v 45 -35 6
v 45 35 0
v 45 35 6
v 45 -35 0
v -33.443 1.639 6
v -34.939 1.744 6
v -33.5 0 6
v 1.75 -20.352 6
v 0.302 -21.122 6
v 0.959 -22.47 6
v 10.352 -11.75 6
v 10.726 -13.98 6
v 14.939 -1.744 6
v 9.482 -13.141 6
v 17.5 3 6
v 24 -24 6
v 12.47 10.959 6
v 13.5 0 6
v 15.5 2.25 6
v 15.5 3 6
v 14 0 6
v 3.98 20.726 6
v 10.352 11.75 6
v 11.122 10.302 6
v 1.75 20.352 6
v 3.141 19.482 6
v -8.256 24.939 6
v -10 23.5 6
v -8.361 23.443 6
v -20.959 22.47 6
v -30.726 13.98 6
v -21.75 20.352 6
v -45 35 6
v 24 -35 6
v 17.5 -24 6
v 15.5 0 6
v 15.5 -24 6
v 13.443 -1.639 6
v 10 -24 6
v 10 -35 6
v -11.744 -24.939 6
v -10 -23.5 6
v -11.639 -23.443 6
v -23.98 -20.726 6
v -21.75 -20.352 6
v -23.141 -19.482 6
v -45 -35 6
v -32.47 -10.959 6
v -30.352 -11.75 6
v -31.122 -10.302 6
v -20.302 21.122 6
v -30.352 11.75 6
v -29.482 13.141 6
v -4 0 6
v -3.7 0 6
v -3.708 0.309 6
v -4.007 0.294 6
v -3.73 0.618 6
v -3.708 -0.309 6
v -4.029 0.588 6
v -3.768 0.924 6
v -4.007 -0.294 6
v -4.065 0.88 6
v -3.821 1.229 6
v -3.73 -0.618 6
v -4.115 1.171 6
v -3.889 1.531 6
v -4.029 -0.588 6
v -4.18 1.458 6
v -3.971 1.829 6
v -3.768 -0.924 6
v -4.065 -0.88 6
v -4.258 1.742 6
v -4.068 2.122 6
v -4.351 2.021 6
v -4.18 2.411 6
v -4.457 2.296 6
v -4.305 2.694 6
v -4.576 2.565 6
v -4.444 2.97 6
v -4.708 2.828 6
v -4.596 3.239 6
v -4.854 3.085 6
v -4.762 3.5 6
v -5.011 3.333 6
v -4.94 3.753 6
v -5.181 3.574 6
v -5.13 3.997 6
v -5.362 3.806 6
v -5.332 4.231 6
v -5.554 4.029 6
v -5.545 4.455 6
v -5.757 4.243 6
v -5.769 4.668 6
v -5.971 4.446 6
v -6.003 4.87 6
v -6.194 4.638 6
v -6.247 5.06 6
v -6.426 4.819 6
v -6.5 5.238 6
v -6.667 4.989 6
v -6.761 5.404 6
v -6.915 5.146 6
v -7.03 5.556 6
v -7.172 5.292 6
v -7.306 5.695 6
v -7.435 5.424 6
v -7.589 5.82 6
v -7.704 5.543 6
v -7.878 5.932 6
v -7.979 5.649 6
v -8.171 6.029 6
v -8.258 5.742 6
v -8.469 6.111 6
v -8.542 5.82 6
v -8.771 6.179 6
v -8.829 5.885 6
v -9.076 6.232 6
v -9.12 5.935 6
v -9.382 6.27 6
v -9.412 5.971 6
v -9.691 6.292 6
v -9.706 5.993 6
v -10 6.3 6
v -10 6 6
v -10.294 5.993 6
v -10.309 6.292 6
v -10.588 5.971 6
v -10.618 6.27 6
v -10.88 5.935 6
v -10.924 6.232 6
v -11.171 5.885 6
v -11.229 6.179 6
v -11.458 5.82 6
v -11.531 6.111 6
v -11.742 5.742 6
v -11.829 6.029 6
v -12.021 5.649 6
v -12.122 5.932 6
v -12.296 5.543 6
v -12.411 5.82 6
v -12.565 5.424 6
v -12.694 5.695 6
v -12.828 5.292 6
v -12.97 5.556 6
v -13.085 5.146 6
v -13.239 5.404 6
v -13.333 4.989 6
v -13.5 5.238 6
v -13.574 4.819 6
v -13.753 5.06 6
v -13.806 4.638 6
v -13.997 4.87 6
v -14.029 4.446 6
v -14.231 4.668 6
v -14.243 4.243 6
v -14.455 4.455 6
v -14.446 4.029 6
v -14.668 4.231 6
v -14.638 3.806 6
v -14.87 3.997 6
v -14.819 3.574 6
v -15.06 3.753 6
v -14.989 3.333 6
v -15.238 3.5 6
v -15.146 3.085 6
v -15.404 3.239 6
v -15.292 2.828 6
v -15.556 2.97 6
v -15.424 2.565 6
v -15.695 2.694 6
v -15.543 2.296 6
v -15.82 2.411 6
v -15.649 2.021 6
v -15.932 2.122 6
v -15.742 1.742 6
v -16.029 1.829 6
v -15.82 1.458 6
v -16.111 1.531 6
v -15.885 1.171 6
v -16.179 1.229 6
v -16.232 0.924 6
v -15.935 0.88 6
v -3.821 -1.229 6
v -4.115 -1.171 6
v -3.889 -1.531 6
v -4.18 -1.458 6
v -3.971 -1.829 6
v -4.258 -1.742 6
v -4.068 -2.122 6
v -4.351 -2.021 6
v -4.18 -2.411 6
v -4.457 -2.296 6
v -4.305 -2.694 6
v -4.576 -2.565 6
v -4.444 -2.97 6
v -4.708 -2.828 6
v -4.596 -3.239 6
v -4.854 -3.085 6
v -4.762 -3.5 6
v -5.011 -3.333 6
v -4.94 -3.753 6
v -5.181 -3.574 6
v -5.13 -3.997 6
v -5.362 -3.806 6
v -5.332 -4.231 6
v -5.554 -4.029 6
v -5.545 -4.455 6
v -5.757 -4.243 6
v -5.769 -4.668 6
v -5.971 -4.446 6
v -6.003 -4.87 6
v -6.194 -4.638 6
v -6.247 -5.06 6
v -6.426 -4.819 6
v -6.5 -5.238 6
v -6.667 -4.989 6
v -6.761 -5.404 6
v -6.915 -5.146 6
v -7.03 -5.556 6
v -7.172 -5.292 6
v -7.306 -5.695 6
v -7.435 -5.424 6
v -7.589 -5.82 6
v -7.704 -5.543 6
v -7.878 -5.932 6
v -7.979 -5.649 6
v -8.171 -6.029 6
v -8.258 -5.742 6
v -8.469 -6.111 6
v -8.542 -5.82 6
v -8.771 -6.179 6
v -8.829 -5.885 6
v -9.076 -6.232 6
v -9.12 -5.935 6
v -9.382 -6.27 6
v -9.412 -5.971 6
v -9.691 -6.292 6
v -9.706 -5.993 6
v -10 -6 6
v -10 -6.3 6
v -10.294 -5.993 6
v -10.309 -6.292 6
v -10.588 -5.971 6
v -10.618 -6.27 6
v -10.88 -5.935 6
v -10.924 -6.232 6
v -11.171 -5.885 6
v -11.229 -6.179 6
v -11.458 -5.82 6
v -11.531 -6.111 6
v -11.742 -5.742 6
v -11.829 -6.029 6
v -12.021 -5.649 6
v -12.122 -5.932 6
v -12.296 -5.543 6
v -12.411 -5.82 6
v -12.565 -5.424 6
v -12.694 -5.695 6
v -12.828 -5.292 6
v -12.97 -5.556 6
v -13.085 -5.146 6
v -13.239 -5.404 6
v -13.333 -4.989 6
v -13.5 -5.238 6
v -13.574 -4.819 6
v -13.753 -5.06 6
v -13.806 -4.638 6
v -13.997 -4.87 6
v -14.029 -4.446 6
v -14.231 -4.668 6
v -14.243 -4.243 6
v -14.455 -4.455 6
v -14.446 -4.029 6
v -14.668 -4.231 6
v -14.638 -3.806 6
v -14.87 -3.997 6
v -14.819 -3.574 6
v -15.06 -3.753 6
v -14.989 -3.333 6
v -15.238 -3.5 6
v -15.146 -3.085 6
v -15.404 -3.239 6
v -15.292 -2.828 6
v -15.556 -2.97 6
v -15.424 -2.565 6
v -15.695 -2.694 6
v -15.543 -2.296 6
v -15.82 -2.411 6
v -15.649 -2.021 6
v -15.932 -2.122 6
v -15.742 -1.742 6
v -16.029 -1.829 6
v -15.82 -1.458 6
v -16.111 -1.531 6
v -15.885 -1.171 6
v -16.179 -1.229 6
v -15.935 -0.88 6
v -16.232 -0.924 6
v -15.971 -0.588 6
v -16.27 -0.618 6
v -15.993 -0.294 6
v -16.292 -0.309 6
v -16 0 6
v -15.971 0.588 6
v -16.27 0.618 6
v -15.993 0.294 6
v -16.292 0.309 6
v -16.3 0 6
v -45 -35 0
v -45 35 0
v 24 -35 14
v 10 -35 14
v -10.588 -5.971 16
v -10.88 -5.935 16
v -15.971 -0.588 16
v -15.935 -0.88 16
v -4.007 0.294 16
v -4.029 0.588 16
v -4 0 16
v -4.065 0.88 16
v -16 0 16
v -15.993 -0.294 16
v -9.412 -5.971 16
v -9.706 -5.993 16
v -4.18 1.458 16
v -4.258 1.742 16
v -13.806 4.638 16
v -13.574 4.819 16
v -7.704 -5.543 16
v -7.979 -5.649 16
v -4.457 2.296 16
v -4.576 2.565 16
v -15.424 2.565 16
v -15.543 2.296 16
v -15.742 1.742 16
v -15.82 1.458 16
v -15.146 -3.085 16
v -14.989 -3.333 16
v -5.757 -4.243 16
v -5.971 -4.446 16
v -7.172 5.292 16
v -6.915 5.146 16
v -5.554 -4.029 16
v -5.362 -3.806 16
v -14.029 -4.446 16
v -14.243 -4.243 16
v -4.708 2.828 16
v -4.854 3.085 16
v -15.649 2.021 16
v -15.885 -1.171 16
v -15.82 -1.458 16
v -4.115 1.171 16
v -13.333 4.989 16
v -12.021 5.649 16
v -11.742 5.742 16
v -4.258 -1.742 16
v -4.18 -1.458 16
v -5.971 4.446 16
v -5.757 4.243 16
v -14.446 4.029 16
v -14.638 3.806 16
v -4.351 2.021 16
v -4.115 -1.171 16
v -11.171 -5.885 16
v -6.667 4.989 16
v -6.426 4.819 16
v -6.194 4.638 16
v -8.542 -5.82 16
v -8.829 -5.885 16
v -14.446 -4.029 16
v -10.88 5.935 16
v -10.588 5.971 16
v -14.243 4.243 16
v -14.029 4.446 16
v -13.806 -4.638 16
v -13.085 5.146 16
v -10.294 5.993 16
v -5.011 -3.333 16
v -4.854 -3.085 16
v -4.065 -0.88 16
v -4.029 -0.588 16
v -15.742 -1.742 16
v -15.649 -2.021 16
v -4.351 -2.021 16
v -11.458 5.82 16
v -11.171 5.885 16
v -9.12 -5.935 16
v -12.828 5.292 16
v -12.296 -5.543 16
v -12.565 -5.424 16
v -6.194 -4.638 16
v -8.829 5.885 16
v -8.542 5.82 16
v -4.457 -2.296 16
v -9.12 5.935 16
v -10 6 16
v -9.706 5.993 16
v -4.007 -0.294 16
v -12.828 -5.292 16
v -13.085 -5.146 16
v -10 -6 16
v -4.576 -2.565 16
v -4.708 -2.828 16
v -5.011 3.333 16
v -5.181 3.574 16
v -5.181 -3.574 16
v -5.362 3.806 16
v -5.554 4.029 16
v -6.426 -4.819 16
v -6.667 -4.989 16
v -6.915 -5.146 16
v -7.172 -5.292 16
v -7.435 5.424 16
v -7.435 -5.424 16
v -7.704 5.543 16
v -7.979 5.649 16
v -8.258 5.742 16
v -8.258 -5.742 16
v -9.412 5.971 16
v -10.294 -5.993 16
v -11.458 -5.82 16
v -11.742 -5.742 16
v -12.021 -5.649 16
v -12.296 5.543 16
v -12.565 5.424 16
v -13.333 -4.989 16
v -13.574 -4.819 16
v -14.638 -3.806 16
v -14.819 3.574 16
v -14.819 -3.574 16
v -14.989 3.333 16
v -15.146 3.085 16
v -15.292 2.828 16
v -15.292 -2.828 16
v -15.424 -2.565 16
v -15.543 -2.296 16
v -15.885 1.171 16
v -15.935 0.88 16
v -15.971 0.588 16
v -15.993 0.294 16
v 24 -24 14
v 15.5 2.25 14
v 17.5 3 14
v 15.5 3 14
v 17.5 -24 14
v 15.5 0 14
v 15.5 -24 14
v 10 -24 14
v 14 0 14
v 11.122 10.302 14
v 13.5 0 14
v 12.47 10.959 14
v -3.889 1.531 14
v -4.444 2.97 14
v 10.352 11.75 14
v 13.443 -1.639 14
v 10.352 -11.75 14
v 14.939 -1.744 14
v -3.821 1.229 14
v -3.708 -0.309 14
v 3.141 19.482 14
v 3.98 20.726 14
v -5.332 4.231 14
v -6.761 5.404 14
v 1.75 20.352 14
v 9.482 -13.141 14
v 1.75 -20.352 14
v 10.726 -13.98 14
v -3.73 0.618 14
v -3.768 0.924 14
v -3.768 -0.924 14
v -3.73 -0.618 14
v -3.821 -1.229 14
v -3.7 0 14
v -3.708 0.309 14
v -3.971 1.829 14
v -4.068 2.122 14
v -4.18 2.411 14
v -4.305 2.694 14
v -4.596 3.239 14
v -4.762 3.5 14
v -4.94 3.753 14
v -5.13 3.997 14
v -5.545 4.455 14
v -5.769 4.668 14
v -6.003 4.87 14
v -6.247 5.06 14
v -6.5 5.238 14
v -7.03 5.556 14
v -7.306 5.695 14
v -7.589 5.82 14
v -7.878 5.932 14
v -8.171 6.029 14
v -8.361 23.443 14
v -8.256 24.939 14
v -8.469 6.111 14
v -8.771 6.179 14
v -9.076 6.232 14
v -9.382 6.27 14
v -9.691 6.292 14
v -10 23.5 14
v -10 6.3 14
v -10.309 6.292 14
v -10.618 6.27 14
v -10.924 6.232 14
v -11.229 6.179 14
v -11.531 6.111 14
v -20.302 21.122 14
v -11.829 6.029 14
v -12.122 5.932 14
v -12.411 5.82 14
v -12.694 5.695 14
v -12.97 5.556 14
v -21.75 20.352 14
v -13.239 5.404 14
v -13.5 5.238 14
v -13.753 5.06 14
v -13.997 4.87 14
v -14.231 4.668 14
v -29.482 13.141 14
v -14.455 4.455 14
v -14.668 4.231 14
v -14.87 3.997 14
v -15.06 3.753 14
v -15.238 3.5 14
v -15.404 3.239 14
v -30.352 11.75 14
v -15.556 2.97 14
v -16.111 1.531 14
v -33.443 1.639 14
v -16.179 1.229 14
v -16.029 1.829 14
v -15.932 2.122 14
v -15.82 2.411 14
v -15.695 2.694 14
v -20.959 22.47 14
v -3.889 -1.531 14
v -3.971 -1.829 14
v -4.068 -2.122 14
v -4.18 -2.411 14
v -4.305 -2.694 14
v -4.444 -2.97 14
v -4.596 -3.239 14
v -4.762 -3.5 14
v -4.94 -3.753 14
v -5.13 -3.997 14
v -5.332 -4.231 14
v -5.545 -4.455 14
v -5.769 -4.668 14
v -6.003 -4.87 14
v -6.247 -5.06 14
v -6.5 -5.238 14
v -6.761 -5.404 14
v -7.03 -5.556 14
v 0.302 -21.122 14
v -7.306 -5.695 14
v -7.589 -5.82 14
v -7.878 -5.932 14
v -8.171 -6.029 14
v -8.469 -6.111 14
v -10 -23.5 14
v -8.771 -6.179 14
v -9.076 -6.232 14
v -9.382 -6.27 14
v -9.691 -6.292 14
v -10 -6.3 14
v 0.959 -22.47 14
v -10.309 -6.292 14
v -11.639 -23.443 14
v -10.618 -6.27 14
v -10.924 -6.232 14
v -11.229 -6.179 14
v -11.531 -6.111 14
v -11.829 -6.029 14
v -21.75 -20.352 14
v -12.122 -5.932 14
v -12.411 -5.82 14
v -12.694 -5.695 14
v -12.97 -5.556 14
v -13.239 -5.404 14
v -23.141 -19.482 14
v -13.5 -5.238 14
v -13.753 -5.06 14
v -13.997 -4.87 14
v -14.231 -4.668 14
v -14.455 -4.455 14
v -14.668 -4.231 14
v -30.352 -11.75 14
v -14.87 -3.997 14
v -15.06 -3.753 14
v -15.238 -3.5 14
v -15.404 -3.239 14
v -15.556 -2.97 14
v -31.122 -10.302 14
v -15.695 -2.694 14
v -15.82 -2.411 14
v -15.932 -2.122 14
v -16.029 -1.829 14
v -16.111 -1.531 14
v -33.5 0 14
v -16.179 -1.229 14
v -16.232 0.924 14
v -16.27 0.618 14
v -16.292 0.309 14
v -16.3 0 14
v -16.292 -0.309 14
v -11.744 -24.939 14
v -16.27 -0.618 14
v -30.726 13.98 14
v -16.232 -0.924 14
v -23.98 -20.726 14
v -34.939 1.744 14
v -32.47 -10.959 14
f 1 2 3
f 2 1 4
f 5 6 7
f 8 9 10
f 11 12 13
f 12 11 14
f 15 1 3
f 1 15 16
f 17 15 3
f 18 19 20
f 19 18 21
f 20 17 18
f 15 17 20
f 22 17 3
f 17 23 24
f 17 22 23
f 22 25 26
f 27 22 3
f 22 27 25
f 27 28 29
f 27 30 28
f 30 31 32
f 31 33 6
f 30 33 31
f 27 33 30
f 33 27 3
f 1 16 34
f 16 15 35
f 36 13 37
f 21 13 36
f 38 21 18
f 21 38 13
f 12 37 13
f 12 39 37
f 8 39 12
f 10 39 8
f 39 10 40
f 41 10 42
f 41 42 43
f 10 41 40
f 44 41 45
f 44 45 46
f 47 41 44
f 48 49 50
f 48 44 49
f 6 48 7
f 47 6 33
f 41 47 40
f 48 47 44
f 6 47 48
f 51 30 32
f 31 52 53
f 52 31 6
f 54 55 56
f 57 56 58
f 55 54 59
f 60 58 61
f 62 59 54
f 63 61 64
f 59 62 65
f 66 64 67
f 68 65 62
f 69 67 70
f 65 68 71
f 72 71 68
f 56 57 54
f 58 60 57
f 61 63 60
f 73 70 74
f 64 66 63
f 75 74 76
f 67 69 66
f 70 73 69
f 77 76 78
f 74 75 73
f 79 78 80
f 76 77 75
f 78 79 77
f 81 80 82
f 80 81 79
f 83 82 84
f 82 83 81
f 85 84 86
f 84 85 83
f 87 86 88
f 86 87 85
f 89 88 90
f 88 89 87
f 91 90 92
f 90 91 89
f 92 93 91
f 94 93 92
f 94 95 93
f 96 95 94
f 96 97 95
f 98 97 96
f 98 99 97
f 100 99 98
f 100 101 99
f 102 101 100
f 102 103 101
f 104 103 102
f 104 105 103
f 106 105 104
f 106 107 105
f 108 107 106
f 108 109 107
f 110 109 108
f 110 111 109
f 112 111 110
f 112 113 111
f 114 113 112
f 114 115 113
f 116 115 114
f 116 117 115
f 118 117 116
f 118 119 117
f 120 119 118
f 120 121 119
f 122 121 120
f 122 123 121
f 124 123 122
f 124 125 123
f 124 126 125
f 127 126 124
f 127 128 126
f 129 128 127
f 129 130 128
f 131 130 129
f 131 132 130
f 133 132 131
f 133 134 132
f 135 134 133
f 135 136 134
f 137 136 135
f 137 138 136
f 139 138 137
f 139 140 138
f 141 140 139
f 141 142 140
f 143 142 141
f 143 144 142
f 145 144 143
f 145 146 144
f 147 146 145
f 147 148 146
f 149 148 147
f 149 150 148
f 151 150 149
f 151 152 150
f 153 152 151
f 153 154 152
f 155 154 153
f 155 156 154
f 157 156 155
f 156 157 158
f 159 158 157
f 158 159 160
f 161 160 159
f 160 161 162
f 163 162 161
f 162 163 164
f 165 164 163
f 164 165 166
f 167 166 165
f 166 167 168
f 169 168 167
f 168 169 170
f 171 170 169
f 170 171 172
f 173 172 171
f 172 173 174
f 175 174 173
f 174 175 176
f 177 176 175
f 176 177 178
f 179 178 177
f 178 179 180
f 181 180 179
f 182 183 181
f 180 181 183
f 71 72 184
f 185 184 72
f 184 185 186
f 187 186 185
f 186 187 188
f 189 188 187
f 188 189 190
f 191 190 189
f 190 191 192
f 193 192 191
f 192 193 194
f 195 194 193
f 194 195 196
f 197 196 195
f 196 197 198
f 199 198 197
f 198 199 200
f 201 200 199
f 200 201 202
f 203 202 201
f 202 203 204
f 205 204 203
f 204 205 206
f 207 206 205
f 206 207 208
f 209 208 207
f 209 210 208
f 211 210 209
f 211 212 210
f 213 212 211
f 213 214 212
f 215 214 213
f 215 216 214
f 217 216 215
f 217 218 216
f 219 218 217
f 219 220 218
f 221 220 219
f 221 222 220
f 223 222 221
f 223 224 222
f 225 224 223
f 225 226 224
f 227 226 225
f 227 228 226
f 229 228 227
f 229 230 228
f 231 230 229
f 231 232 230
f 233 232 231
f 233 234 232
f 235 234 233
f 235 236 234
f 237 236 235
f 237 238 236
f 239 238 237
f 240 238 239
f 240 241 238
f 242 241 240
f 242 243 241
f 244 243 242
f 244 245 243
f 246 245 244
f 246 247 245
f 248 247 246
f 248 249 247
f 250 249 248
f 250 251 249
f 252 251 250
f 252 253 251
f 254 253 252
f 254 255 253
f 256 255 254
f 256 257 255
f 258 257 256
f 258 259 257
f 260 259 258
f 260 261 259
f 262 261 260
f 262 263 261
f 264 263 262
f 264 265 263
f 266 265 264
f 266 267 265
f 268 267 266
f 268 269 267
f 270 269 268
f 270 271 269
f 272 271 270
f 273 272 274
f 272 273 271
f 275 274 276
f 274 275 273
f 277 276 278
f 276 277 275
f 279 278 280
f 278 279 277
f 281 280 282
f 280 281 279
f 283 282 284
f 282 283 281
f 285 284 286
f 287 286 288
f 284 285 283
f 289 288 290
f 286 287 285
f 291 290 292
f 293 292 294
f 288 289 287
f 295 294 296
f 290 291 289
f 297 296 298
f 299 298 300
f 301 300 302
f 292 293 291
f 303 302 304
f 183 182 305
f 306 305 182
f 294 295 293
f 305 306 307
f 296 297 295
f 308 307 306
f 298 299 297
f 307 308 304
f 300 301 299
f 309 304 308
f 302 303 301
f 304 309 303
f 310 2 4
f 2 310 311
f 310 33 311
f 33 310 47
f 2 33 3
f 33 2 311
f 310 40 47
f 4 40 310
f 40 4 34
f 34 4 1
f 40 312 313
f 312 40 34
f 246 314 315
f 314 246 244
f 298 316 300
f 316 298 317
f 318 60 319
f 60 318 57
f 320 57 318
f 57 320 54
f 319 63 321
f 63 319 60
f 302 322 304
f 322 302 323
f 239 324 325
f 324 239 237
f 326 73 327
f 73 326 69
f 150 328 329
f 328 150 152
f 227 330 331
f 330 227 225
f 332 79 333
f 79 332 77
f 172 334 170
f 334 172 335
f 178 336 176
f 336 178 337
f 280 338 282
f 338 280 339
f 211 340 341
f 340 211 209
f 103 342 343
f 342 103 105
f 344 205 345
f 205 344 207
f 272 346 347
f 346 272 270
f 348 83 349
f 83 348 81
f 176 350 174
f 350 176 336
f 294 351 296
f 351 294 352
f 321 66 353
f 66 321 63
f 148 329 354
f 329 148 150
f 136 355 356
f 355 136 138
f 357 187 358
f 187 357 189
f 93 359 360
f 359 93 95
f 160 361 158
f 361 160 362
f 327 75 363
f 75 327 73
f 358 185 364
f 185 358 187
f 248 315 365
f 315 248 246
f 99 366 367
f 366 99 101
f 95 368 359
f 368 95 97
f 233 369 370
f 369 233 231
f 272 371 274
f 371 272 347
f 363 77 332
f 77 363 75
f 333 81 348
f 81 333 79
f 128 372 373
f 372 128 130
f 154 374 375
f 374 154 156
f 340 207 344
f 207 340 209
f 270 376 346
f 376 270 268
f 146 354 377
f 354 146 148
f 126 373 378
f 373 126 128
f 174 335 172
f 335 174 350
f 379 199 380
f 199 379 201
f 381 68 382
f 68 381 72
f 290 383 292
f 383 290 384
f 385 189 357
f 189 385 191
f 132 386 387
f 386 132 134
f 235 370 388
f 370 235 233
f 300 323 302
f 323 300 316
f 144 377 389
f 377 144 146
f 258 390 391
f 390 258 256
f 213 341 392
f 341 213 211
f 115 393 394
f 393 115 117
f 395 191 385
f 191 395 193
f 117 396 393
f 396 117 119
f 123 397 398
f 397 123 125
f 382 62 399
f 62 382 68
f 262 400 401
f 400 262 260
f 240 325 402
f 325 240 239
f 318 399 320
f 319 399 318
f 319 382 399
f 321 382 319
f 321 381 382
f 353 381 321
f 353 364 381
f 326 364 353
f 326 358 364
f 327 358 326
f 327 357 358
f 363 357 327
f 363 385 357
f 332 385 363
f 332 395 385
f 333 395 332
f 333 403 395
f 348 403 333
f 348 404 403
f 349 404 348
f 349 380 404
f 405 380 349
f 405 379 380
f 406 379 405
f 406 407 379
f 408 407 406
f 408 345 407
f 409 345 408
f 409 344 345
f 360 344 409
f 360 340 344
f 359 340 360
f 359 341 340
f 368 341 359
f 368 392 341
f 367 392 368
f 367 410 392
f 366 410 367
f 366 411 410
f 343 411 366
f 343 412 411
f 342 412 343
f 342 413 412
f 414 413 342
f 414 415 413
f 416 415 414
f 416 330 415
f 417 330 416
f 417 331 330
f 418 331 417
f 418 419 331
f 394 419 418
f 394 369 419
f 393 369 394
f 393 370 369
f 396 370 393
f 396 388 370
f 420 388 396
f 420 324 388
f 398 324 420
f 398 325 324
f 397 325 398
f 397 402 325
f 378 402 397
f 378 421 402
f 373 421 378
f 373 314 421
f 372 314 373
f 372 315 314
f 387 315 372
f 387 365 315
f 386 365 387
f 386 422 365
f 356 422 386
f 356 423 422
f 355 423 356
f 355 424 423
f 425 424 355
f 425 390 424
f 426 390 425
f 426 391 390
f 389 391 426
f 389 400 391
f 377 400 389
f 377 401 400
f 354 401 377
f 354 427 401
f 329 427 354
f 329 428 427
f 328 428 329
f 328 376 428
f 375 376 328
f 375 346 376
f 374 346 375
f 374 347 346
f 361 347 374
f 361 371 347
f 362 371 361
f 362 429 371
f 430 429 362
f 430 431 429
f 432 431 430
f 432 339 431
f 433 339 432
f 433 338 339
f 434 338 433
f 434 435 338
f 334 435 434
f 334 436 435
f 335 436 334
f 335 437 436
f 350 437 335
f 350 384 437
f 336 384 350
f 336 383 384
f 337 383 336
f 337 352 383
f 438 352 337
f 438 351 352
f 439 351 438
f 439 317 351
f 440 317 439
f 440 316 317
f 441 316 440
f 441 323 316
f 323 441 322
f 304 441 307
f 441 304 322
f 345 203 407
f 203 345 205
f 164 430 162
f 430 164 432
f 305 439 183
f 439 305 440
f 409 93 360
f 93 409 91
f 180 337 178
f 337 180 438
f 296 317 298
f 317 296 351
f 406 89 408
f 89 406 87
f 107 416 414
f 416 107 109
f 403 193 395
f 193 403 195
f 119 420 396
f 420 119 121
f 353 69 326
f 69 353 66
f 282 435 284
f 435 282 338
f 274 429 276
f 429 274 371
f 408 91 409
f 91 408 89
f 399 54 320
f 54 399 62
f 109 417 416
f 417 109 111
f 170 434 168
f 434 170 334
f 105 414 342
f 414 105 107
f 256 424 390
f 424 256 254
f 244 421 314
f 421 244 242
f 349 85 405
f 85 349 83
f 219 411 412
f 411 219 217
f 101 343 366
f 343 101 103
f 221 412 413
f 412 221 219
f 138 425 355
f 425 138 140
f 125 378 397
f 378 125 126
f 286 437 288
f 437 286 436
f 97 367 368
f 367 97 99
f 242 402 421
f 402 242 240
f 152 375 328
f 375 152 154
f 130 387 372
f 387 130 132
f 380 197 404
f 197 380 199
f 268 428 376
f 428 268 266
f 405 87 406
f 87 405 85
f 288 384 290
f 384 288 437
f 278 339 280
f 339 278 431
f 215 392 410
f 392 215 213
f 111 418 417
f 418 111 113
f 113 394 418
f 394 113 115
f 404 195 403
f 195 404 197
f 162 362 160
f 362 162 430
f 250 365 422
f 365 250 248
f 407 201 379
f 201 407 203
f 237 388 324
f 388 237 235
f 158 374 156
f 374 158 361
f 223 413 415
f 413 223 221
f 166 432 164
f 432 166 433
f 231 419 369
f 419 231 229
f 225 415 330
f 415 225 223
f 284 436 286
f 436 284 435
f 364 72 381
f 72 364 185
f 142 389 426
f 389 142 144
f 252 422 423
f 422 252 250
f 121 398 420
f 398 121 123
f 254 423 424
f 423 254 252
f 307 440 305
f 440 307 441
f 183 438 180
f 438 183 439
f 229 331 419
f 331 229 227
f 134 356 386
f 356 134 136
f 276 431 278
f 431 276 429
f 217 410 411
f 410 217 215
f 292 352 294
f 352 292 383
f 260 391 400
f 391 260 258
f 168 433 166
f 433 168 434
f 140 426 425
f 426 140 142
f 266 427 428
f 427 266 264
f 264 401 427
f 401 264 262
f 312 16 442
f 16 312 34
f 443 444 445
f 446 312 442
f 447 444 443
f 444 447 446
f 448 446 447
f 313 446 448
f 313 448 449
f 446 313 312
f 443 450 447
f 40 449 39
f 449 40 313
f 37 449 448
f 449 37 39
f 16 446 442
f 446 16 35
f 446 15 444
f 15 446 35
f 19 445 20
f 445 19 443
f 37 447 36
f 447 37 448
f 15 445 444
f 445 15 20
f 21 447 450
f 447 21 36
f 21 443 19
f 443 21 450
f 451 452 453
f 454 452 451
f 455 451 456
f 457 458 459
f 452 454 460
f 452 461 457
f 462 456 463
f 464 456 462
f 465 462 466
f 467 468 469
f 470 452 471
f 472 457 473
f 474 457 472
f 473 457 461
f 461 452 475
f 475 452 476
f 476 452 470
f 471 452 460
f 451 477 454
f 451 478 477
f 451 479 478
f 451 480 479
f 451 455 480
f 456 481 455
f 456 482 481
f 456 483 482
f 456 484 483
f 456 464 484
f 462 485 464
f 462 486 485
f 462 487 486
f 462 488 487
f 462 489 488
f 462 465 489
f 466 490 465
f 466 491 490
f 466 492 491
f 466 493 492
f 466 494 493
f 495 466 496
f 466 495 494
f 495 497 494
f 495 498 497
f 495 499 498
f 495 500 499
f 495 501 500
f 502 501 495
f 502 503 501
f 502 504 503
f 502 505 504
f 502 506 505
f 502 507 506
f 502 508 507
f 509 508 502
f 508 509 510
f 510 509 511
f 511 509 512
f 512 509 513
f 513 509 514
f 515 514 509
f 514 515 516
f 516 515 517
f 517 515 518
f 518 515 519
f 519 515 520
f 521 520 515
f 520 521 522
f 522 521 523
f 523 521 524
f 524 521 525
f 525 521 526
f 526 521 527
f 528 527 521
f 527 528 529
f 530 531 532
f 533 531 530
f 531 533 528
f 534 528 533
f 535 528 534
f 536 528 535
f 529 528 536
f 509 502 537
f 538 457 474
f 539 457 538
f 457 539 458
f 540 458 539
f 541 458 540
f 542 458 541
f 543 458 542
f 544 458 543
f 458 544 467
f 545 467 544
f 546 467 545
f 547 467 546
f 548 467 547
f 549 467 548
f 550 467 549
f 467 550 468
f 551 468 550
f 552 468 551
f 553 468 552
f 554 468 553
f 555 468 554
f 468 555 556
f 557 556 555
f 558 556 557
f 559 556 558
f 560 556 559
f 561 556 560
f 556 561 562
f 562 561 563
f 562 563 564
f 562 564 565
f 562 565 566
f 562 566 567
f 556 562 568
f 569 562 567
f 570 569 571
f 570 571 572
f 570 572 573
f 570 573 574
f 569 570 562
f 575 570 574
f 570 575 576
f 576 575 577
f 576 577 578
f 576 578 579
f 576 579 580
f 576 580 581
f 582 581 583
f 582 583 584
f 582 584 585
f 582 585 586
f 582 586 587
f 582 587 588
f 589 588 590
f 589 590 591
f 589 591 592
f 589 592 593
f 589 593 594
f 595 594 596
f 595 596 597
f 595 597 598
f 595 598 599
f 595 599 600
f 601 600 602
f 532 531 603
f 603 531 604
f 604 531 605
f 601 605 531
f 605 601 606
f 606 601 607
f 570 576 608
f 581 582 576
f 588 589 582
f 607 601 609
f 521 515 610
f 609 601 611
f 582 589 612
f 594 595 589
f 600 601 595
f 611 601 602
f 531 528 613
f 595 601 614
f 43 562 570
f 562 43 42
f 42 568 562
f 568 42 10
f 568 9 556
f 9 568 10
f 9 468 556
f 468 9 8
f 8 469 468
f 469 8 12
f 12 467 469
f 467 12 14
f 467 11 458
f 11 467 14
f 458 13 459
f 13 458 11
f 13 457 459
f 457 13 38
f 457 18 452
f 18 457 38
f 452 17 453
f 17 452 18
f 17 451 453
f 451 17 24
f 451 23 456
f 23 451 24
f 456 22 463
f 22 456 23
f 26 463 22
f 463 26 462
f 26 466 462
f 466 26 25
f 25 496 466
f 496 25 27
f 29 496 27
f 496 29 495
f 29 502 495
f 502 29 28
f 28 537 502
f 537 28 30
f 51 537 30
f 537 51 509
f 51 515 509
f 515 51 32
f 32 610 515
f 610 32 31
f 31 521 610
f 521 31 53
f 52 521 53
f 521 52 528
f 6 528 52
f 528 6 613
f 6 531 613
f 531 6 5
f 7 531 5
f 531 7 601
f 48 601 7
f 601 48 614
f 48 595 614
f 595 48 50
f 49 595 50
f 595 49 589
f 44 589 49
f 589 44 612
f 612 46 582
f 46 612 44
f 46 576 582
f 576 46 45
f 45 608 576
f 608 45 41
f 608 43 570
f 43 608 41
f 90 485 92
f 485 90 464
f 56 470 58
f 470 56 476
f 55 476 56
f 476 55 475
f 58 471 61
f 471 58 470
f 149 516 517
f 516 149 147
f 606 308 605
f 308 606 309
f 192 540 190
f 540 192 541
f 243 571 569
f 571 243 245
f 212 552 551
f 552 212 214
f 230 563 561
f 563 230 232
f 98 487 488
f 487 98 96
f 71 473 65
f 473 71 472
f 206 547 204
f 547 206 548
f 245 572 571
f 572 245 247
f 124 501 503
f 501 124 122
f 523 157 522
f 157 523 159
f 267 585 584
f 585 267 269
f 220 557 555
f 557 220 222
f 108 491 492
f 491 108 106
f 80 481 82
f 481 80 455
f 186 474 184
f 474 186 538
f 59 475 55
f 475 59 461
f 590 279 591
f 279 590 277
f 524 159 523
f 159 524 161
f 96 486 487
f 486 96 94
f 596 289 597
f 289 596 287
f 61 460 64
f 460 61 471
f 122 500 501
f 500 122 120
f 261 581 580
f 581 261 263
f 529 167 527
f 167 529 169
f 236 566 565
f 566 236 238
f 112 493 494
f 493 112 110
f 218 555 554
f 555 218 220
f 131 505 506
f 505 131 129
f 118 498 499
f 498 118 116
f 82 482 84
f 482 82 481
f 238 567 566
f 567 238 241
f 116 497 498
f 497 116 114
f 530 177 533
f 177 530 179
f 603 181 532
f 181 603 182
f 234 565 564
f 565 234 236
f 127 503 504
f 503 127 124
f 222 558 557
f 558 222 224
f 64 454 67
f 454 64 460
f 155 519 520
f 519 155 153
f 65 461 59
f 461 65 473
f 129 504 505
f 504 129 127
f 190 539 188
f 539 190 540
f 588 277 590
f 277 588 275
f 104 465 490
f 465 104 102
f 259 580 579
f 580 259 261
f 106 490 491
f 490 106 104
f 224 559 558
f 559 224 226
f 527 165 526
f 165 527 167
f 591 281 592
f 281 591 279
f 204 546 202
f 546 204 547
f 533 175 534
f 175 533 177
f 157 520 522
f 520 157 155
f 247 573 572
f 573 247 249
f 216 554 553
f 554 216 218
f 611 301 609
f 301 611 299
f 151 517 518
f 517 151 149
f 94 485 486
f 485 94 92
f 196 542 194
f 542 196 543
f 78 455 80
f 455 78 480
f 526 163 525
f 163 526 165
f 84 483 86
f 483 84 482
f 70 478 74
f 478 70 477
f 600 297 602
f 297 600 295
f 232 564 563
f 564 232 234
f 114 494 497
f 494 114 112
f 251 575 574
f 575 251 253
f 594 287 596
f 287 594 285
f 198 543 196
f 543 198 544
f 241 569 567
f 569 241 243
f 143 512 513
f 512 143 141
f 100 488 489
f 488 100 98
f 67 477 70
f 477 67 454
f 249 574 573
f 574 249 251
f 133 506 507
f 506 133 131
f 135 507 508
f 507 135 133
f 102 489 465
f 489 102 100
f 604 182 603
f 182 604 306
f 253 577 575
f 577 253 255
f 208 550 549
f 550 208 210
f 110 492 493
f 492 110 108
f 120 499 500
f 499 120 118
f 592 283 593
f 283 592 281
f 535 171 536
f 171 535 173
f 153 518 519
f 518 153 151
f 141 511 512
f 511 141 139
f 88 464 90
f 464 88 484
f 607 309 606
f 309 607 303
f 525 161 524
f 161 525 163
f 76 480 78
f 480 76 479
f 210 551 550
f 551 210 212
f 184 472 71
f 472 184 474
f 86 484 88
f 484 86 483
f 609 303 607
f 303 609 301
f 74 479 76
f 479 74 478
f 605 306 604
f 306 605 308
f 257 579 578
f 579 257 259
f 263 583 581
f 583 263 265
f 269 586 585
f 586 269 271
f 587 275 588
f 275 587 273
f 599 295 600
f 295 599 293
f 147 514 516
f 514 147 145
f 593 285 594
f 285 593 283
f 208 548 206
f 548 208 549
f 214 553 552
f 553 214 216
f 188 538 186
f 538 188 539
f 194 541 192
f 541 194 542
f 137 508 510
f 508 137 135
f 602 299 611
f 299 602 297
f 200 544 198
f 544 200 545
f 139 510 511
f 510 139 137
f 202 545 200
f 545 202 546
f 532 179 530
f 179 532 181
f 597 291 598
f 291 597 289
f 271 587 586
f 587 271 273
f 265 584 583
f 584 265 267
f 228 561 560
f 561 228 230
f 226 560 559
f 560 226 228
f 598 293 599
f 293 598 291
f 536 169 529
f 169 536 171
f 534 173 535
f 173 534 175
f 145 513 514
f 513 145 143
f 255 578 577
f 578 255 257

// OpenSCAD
/* Ratchet wheel with spring pawl - PLA, 0.4 nozzle, no supports */
// Wheel ~50mm dia, 12 teeth. Free clockwise (from above), locks CCW.
// Print orientation: both parts flat, +Z up, bottom on bed.

/* [Part] */
part = "assembly"; // [wheel, base, assembly]
cadverify_only = "";
module instance(name, part, unit = 1) {
    echo(cadverify_instance = [name, part, unit]);
    if (cadverify_only == "" || cadverify_only == name) children();
}

// ---- parameters (mm) ----
Ro = 25;            // wheel tip radius (dia 50)
Rr = 23.5;          // wheel root radius (tooth height 1.5)
Nteeth = 12;
pitch = 360/Nteeth; // 30
gentle_span = 26;   // valley->tip CCW (gentle ramp)
wheel_t = 8;        // wheel thickness
bore_d = 12.6;      // wheel bore
post_d = 12;        // post diameter
post_h = 10;        // post height above base top
base_x = 90;
base_y = 70;
base_t = 6;
wheel_cx = -10;     // post/wheel centre in base coords
wheel_cy = 0;
base_top = base_t;  // 6
// pawl / arm
beam_x0 = 15.5; beam_x1 = 17.5;   // beam 2mm thick in X
beam_y0 = -30; beam_y1 = 3;       // beam length
beam_z0 = 6; beam_z1 = 14;        // beam height 8
tip_x = 14.0;       // pawl tip westmost (1.0 inside tip circle: 25-24=1.0)

$fn = 128;

// ---- wheel: centred at (0,0), bottom z=0 ----
module wheel() {
    difference() {
        linear_extrude(height = wheel_t, convexity = 4)
            polygon(points = [ for (i = [0:Nteeth-1]) each [
                [Rr*cos(i*pitch), Rr*sin(i*pitch)],
                [Ro*cos(i*pitch+gentle_span), Ro*sin(i*pitch+gentle_span)],
                [Rr*cos(i*pitch+gentle_span), Rr*sin(i*pitch+gentle_span)]
            ]]);
        translate([0,0,-1]) cylinder(d = bore_d, h = wheel_t+2);
    }
}

// ---- base: plate centred at origin, bottom z=0, post at (wheel_cx,wheel_cy) ----
module base() {
    union() {
        // plate
        translate([-base_x/2, -base_y/2, 0]) cube([base_x, base_y, base_t]);
        // post
        translate([wheel_cx, wheel_cy, base_top]) cylinder(d = post_d, h = post_h);
        // anchor block
        translate([10, -35, 6]) cube([14, 11, 8]);
        // flexible beam (2mm thick, ~33mm long, 8mm tall)
        translate([beam_x0, beam_y0, beam_z0]) cube([beam_x1-beam_x0, beam_y1-beam_y0, beam_z1-beam_z0]);
        // pawl tip wedge: tip (tip_x,0), overlap 0.5 into beam; north ramp, south flat
        linear_extrude(height = 8, convexity = 2)
            polygon(points = [[tip_x,0],[16,0],[16,3]]);
        // shift pawl wedge up to beam height (extrude from 0 -> translate)
    }
}

// pawl wedge is extruded 0..8, need to lift to 6..14: wrap
module base_fixed() {
    union() {
        translate([-base_x/2, -base_y/2, 0]) cube([base_x, base_y, base_t]);
        translate([wheel_cx, wheel_cy, base_top]) cylinder(d = post_d, h = post_h);
        translate([10, -35, 6]) cube([14, 11, 8]);
        translate([beam_x0, beam_y0, beam_z0]) cube([beam_x1-beam_x0, beam_y1-beam_y0, beam_z1-beam_z0]);
        translate([0,0,6]) linear_extrude(height = 8, convexity = 2)
            polygon(points = [[tip_x,0],[16,0],[16,3]]);
    }
}

// ---- specs ----
if (part == "wheel") echo(cadverify_spec = [
    ["bounds", [[-Ro, -Ro, 0], [Ro, Ro, wheel_t]]],
    ["bodies", 1],
    ["through_holes", 1],
    ["support_faces", [["bed", "-z", 1000]]],
    ["overhangs_allowed", []],
    ["copies", 1],
    ["details", [
        ["bore", "hole", [0, 0, 10], [0, 0, -1], [[0, bore_d], [wheel_t-0.5, bore_d]]],
        ["rim", "thickness", [0, 15, 10], [0, 0, -1], wheel_t],
        ["tooth", "material", [[20.5, 5.5, 0], [22.5, 8.5, wheel_t]], 0.5],
        ["teeth", "view", [[20, -25, 0], [Ro, 25, wheel_t]]]
    ]]
]);

if (part == "base") echo(cadverify_spec = [
    ["bounds", [[-base_x/2, -base_y/2, 0], [base_x/2, base_y/2, base_top+post_h]]],
    ["bodies", 1],
    ["support_faces", [["bed", "-z", 4000]]],
    ["overhangs_allowed", []],
    ["copies", 1],
    ["details", [
        ["plate", "thickness", [-30, 20, 10], [0, 0, -1], base_t],
        ["post", "material", [[wheel_cx-6, wheel_cy-6, base_top], [wheel_cx+6, wheel_cy+6, base_top+post_h]], 0.5],
        ["arm", "material", [[beam_x0, beam_y0, beam_z0], [beam_x1, beam_y1, beam_z1]], 0.9],
        ["pawl_tip", "view", [[14.0, -1, 6], [16, 3.5, 14]]]
    ]]
]);

if (part == "assembly") echo(cadverify_spec = [
    ["bounds", [[-base_x/2, -base_y/2, 0], [base_x/2, base_y/2, base_top+post_h]]],
    ["motions", [
        ["click", ["wheel1"], "rotate", [wheel_cx, wheel_cy, base_top], [0, 0, 1], [0, -360]]
    ]],
    ["assembly_order", [
        [["base1"], [0, 0, 0]],
        [["wheel1"], [0, 0, -30], ["flex", [["wheel1", "base1", 1.0, "pawl snaps aside as rim passes"]]]]
    ]]
]);

// ---- geometry dispatch ----
if (part == "wheel") wheel();
else if (part == "base") base_fixed();
else if (part == "assembly") {
    instance("base1", "base") base_fixed();
    instance("wheel1", "wheel") translate([wheel_cx, wheel_cy, base_top]) wheel();
}
